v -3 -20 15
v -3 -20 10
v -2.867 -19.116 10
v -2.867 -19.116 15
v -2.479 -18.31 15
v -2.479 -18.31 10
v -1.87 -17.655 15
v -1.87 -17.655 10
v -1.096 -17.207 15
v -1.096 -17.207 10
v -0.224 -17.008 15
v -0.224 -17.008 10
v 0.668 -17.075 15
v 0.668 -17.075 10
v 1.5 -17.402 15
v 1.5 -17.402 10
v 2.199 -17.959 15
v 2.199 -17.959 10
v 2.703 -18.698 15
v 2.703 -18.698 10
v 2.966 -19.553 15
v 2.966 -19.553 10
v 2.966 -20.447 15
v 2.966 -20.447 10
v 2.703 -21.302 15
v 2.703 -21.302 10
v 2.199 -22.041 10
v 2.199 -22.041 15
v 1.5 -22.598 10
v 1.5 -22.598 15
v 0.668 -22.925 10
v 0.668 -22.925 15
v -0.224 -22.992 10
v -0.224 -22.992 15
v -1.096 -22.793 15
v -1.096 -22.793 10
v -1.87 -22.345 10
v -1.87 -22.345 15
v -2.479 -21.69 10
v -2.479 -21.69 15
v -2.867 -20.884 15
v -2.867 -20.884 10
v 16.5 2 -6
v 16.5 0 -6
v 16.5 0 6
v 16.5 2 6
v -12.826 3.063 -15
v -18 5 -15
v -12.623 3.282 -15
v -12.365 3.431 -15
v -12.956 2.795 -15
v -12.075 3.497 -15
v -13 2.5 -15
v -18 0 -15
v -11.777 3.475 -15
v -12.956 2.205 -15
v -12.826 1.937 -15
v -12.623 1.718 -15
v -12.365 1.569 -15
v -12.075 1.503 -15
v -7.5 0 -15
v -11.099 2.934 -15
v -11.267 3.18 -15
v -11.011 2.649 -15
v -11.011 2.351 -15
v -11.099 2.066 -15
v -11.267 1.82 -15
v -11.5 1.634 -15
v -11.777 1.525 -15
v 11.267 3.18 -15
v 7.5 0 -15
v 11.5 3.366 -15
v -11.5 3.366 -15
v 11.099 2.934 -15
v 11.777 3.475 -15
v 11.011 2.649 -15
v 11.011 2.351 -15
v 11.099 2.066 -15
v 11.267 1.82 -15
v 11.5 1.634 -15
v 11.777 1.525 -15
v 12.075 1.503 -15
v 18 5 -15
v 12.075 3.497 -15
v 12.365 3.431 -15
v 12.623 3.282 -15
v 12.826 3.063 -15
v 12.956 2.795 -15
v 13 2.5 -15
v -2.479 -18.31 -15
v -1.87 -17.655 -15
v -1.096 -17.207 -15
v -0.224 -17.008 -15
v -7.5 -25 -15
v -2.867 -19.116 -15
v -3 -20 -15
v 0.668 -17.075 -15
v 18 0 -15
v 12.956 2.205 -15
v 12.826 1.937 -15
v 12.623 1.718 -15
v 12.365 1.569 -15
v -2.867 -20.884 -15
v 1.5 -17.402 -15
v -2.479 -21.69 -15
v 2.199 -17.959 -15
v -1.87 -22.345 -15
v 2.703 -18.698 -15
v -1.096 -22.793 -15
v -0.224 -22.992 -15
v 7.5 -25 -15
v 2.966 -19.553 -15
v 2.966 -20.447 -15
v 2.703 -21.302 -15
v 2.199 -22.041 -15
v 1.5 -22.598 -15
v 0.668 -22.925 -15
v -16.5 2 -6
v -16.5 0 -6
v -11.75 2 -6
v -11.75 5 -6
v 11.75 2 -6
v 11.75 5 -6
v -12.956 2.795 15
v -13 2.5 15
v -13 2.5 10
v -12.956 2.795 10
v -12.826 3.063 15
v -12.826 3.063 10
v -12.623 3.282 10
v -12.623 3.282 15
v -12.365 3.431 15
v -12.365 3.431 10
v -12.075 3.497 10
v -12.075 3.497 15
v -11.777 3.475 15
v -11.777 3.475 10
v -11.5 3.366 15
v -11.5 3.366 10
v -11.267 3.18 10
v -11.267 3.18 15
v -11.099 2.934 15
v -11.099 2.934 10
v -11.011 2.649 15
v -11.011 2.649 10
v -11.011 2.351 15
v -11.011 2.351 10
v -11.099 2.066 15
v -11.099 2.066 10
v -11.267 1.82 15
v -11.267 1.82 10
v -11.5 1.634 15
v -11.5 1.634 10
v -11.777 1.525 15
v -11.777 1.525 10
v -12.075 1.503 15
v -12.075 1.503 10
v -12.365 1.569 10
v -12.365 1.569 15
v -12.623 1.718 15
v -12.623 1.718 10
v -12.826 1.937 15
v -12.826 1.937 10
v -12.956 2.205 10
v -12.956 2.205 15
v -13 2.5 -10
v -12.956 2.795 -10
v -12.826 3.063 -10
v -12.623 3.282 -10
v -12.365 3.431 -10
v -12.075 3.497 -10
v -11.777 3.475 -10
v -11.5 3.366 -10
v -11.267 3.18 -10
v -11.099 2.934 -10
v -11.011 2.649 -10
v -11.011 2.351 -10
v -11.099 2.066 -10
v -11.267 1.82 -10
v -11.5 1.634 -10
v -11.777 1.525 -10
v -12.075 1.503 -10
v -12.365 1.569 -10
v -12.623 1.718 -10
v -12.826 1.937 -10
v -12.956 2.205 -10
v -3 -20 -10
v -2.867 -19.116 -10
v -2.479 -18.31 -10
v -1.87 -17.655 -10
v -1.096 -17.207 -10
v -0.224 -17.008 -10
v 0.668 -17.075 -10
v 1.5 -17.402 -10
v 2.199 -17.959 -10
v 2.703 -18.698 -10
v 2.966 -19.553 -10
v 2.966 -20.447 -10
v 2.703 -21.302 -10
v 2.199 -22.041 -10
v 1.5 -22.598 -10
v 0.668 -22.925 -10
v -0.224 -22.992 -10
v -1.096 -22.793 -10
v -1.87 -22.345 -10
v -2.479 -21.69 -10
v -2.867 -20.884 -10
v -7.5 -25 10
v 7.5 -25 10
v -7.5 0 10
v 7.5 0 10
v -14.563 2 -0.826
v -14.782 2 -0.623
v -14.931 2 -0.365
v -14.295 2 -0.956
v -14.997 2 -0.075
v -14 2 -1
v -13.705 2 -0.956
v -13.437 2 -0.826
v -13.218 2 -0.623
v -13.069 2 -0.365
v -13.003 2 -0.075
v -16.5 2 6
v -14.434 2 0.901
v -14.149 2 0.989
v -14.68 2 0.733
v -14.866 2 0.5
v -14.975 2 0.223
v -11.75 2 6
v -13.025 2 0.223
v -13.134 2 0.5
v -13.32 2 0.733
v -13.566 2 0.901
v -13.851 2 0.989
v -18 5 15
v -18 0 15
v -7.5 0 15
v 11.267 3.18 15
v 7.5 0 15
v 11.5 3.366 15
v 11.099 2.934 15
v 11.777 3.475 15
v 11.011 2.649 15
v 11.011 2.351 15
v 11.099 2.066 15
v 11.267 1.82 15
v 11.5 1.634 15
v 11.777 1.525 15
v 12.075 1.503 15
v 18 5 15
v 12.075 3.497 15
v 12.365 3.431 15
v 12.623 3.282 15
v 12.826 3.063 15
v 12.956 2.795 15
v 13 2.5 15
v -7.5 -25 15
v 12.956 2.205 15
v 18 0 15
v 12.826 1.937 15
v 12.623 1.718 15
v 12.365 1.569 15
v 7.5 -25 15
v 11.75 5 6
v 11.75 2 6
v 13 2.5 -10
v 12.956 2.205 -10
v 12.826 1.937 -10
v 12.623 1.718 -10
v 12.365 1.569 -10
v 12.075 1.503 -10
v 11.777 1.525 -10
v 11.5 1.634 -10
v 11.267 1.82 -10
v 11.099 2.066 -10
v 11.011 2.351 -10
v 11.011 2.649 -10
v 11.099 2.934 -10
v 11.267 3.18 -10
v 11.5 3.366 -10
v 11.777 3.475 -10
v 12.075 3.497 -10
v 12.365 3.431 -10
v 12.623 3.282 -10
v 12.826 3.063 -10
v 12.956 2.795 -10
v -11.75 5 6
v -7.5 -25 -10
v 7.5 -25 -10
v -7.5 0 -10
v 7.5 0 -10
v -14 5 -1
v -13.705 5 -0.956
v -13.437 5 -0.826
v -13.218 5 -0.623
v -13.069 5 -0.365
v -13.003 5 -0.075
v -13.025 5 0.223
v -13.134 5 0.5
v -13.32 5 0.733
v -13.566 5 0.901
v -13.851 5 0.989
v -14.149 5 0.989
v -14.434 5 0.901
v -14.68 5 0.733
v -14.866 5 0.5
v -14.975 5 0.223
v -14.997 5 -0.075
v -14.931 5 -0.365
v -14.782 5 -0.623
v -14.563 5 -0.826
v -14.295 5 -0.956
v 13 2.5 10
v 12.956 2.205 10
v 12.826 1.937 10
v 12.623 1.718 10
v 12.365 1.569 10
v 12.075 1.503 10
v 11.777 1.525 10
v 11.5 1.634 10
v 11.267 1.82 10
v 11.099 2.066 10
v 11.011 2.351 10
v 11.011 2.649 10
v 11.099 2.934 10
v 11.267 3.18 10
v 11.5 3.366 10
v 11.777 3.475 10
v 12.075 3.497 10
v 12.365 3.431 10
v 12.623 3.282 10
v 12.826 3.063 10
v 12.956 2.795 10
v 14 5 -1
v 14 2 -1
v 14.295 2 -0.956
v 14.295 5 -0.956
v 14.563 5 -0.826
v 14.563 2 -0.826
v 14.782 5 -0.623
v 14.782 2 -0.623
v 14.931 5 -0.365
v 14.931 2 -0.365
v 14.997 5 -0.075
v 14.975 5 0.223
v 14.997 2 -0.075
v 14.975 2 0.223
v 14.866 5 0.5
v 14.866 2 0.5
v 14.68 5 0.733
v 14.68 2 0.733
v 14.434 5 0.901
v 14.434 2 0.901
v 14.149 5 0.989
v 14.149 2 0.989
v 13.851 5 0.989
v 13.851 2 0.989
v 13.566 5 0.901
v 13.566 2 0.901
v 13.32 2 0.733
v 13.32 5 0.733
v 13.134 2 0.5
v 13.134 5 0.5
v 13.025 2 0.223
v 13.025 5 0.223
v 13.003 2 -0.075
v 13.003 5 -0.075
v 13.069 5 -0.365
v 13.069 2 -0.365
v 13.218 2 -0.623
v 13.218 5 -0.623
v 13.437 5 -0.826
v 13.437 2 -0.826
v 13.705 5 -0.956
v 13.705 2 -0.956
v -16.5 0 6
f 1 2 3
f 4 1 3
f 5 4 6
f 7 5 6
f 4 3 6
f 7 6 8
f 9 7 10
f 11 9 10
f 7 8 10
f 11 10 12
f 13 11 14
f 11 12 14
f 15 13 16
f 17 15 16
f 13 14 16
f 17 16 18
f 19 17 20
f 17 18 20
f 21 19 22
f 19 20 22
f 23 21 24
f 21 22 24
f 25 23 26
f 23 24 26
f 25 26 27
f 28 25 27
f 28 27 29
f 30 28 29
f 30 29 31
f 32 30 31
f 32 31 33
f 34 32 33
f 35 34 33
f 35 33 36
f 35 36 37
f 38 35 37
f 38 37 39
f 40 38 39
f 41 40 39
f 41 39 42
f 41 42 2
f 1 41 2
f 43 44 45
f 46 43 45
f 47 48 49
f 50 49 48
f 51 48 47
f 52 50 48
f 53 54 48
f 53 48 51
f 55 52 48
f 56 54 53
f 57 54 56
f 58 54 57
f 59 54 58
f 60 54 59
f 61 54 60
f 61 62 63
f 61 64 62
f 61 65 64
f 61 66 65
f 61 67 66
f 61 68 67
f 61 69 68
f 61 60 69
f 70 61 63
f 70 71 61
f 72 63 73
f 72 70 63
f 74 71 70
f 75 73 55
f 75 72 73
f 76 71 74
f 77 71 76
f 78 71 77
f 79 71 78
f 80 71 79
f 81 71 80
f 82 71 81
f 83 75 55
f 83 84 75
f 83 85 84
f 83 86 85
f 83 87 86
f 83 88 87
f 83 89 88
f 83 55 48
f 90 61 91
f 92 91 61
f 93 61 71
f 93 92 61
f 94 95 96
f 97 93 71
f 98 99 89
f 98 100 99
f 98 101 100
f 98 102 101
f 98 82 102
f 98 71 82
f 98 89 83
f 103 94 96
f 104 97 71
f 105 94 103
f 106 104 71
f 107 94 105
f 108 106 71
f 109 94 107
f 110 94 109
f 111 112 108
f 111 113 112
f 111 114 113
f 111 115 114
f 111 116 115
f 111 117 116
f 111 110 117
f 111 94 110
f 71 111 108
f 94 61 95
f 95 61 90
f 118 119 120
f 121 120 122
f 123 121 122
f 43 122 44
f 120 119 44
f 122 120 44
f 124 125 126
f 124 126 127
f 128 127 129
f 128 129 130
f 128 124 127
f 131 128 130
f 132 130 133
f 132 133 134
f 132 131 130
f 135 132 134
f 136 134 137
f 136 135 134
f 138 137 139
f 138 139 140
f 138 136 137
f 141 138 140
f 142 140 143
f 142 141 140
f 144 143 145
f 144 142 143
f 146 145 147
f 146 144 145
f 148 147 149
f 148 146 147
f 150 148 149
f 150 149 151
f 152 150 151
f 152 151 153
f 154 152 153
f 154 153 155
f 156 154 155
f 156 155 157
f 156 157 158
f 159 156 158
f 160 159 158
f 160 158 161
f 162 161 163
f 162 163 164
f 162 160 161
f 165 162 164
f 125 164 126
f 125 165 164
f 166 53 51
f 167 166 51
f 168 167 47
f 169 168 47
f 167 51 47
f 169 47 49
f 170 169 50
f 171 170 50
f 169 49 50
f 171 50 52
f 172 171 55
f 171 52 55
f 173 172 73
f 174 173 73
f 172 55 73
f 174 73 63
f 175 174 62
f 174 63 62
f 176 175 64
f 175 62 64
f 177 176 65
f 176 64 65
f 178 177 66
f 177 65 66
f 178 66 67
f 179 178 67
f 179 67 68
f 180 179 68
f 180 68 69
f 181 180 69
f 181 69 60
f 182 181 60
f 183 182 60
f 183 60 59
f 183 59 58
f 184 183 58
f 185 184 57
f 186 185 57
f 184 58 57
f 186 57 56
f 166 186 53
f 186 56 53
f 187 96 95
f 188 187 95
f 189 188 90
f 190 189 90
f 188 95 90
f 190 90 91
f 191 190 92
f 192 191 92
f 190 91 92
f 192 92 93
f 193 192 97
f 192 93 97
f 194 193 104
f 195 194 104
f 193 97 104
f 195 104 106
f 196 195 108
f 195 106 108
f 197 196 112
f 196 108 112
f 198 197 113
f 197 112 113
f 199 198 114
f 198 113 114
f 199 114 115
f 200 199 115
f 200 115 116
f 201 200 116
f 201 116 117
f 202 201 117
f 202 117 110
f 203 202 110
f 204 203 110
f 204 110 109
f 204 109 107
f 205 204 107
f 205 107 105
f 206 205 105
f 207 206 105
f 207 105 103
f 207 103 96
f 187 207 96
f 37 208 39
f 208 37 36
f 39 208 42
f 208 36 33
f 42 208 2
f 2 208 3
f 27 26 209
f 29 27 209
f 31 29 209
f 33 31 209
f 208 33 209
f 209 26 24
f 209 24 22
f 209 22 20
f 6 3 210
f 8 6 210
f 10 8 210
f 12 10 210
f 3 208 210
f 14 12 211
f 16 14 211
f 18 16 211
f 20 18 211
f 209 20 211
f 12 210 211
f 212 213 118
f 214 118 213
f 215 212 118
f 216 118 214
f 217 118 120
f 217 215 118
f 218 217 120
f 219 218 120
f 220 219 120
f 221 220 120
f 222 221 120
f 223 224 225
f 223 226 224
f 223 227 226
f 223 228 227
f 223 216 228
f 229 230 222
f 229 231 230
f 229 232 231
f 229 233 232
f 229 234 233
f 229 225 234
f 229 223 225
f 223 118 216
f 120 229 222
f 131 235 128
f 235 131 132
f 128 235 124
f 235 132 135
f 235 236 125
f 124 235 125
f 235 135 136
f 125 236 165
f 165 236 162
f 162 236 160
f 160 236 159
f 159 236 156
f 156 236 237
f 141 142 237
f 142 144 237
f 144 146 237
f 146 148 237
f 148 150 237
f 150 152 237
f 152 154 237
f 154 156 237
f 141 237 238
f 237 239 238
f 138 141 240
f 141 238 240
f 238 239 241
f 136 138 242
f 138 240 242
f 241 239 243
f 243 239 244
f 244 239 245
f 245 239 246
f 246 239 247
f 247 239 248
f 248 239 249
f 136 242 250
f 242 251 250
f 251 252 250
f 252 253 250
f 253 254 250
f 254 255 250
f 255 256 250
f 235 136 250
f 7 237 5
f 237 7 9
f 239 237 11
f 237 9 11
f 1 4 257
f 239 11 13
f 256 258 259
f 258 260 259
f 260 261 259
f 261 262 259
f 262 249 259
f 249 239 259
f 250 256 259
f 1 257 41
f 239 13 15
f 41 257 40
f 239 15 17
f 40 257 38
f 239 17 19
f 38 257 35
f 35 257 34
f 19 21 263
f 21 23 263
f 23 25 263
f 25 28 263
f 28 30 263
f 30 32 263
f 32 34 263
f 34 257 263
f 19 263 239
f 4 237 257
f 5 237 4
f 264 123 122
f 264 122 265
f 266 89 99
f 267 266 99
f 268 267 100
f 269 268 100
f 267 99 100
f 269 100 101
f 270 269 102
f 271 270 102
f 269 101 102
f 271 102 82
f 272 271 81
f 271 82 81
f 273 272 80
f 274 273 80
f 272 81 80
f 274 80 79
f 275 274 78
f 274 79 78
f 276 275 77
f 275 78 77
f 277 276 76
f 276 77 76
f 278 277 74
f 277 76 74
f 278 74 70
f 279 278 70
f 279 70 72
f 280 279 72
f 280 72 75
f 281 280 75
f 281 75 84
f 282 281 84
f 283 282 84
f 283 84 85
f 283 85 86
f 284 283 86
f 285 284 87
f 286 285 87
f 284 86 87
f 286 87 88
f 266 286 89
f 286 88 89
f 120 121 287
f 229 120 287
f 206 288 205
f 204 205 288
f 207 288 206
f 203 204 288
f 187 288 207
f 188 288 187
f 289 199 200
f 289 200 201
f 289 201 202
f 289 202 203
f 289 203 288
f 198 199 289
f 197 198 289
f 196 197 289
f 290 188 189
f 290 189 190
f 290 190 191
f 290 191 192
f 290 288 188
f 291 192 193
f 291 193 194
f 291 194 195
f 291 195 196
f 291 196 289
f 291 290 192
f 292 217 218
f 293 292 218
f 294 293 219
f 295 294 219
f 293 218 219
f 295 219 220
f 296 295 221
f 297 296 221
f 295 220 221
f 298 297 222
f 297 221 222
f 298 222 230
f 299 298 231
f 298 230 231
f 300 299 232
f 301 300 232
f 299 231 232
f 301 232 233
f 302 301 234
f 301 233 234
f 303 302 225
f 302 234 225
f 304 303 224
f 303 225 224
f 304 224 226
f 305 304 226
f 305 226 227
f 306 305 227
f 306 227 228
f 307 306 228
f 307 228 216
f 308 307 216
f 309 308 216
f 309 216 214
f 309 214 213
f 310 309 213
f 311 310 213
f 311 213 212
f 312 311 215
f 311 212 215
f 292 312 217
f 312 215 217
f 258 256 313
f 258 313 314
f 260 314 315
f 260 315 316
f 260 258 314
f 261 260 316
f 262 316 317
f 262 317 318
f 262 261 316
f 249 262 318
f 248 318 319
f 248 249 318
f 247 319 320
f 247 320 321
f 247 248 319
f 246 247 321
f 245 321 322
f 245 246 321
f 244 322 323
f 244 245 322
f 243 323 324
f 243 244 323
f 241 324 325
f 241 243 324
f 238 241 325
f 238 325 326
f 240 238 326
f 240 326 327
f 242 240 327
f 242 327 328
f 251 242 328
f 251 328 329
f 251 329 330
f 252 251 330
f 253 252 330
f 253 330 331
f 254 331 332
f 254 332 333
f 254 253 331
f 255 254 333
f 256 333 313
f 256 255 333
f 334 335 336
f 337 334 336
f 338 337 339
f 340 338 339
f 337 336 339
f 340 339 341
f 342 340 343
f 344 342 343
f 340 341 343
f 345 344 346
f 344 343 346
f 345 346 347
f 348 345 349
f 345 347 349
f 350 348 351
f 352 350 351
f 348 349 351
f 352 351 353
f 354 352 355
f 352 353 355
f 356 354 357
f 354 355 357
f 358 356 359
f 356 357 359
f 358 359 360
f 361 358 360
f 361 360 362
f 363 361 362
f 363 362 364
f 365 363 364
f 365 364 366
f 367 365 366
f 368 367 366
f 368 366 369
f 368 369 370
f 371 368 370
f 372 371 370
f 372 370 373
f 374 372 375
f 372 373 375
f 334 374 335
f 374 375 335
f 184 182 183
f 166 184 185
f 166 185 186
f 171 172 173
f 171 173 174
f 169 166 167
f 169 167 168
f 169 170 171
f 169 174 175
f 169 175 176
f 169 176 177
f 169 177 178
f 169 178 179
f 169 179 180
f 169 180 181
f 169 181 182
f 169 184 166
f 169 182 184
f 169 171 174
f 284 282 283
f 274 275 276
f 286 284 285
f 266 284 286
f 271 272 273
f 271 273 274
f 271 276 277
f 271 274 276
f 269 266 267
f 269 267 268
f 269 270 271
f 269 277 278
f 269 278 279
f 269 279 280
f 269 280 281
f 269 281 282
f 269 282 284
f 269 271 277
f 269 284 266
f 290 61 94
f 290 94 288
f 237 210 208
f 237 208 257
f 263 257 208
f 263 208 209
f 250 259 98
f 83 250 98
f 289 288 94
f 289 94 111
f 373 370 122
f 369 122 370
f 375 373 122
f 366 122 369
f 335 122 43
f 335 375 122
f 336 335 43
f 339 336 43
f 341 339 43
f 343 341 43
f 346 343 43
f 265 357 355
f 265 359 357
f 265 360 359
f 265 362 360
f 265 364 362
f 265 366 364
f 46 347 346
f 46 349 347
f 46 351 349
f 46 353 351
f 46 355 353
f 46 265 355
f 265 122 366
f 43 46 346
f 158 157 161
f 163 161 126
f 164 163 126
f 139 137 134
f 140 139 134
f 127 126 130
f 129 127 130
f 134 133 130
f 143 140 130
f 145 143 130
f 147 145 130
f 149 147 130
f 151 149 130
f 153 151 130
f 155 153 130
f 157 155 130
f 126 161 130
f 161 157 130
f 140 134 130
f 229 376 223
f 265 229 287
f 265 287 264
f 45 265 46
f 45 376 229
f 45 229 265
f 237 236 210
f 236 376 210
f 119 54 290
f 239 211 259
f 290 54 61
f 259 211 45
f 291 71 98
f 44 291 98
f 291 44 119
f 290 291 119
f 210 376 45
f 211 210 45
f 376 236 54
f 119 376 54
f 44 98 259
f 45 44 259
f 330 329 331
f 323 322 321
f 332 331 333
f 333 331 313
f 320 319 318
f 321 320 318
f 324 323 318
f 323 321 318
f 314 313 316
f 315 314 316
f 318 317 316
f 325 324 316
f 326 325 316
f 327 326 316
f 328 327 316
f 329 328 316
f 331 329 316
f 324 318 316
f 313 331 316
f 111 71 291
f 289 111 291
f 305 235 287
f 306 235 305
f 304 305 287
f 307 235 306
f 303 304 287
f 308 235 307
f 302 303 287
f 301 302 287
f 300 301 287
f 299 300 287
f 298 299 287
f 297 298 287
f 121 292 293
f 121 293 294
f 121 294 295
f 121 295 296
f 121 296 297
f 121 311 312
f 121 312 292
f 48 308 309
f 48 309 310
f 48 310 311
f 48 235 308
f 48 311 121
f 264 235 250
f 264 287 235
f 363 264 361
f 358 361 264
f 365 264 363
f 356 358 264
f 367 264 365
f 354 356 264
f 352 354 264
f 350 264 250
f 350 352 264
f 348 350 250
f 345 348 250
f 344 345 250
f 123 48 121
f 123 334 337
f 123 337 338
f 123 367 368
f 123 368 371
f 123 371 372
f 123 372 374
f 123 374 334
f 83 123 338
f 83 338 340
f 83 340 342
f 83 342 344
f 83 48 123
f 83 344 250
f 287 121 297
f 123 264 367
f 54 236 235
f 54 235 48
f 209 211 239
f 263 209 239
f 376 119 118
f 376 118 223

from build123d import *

# Parameters (mm, degrees)
SKETCH_1_W               = 36
SKETCH_1_H               = 30
EXTRUDE_1_DEPTH          = 5
SKETCH_4_W               = 33
SKETCH_4_H               = 12
CUT_EXTRUDE_2_DEPTH      = 2
SKETCH_8_R               = 1
CUT_EXTRUDE_6_DEPTH      = 3
CUT_EXTRUDE_3_DEPTH      = 24.622023622
CUT_EXTRUDE_3_DEPTH_BACK = 3
SKETCH_5_W               = 23.5
SKETCH_5_H               = 12
SKETCH_9_R               = 1
CUT_EXTRUDE_7_DEPTH      = 5
SKETCH_11_W              = 15
SKETCH_11_H              = 5
EXTRUDE_3_DEPTH          = 25
CUT_EXTRUDE_8_REACH      = 45
SKETCH_12_R              = 3


with BuildPart() as part:
    # 草图1 → 凸台-拉伸1 (new body)
    with BuildSketch(Plane(origin=(0, 0, 0), x_dir=(1, 0, 0), z_dir=(0, 1, 0))):
        Rectangle(SKETCH_1_W, SKETCH_1_H)
    extrude(amount=EXTRUDE_1_DEPTH)

    # 草图4 → 切除-拉伸2 (cut)
    with BuildSketch(Plane.XZ):
        Rectangle(SKETCH_4_W, SKETCH_4_H)
    extrude(amount=-CUT_EXTRUDE_2_DEPTH, mode=Mode.SUBTRACT)

    # 草图8 → 切除-拉伸6 (cut)
    with BuildSketch(Plane.XZ.offset(-2)):
        with Locations(Location((14, 0, 0), (0, 0, 270))):
            Circle(SKETCH_8_R)
        with Locations(Location((-14, 0, 0), (0, 0, 270))):
            Circle(SKETCH_8_R)
    extrude(amount=-CUT_EXTRUDE_6_DEPTH, mode=Mode.SUBTRACT)

    # 草图5 → 切除-拉伸3 (cut, two sides: drawn at the far end of the back side and taken through both)
    with BuildSketch(Plane.XZ.offset(-2).offset(-CUT_EXTRUDE_3_DEPTH_BACK)):
        Rectangle(SKETCH_5_W, SKETCH_5_H)
    extrude(amount=CUT_EXTRUDE_3_DEPTH + CUT_EXTRUDE_3_DEPTH_BACK, mode=Mode.SUBTRACT)

    # 草图9 → 切除-拉伸7 (cut)
    with BuildSketch(Plane(origin=(0, 0, -15), x_dir=(-1, 0, 0), z_dir=(0, 0, -1))):
        with Locations((12, 2.5)):
            Circle(SKETCH_9_R)
        with Locations(Location((-12, 2.5, 0), (0, 0, 180))):
            Circle(SKETCH_9_R)
    cut_extrude_7 = extrude(amount=-CUT_EXTRUDE_7_DEPTH, mode=Mode.SUBTRACT)

    # 镜向1: 切除-拉伸7 across plane
    add(cut_extrude_7.mirror(Plane.XY), mode=Mode.SUBTRACT)

    # 草图11 → 凸台-拉伸3 (add)
    with BuildSketch(Plane.XZ):
        with Locations((0, 12.5)):
            Rectangle(SKETCH_11_W, SKETCH_11_H)
        with Locations((0, -12.5)):
            Rectangle(SKETCH_11_W, SKETCH_11_H)
    extrude(amount=EXTRUDE_3_DEPTH)

    # 切除-拉伸8: up to this face of the body (flat: up to its plane)
    cut_extrude_8_end = Plane(part.part.faces().sort_by_distance((0, -7.75118941, 15))[0])
    # 草图12 → 切除-拉伸8 (cut, up to the picked face)
    with BuildSketch(Plane(origin=(0, 0, -15), x_dir=(-1, 0, 0), z_dir=(0, 0, -1)), mode=Mode.PRIVATE) as cut_extrude_8_sk1:
        with Locations((0, -20)):
            Circle(SKETCH_12_R)
    cut_extrude_8_tool1 = split(extrude(cut_extrude_8_sk1.sketch, amount=-CUT_EXTRUDE_8_REACH, mode=Mode.PRIVATE), bisect_by=cut_extrude_8_end, keep=Keep.BOTH, mode=Mode.PRIVATE)
    add(cut_extrude_8_tool1.solids().sort_by(Axis((0, -20, -15), (0, 0, 1)))[0], mode=Mode.SUBTRACT)


solid = part.part
